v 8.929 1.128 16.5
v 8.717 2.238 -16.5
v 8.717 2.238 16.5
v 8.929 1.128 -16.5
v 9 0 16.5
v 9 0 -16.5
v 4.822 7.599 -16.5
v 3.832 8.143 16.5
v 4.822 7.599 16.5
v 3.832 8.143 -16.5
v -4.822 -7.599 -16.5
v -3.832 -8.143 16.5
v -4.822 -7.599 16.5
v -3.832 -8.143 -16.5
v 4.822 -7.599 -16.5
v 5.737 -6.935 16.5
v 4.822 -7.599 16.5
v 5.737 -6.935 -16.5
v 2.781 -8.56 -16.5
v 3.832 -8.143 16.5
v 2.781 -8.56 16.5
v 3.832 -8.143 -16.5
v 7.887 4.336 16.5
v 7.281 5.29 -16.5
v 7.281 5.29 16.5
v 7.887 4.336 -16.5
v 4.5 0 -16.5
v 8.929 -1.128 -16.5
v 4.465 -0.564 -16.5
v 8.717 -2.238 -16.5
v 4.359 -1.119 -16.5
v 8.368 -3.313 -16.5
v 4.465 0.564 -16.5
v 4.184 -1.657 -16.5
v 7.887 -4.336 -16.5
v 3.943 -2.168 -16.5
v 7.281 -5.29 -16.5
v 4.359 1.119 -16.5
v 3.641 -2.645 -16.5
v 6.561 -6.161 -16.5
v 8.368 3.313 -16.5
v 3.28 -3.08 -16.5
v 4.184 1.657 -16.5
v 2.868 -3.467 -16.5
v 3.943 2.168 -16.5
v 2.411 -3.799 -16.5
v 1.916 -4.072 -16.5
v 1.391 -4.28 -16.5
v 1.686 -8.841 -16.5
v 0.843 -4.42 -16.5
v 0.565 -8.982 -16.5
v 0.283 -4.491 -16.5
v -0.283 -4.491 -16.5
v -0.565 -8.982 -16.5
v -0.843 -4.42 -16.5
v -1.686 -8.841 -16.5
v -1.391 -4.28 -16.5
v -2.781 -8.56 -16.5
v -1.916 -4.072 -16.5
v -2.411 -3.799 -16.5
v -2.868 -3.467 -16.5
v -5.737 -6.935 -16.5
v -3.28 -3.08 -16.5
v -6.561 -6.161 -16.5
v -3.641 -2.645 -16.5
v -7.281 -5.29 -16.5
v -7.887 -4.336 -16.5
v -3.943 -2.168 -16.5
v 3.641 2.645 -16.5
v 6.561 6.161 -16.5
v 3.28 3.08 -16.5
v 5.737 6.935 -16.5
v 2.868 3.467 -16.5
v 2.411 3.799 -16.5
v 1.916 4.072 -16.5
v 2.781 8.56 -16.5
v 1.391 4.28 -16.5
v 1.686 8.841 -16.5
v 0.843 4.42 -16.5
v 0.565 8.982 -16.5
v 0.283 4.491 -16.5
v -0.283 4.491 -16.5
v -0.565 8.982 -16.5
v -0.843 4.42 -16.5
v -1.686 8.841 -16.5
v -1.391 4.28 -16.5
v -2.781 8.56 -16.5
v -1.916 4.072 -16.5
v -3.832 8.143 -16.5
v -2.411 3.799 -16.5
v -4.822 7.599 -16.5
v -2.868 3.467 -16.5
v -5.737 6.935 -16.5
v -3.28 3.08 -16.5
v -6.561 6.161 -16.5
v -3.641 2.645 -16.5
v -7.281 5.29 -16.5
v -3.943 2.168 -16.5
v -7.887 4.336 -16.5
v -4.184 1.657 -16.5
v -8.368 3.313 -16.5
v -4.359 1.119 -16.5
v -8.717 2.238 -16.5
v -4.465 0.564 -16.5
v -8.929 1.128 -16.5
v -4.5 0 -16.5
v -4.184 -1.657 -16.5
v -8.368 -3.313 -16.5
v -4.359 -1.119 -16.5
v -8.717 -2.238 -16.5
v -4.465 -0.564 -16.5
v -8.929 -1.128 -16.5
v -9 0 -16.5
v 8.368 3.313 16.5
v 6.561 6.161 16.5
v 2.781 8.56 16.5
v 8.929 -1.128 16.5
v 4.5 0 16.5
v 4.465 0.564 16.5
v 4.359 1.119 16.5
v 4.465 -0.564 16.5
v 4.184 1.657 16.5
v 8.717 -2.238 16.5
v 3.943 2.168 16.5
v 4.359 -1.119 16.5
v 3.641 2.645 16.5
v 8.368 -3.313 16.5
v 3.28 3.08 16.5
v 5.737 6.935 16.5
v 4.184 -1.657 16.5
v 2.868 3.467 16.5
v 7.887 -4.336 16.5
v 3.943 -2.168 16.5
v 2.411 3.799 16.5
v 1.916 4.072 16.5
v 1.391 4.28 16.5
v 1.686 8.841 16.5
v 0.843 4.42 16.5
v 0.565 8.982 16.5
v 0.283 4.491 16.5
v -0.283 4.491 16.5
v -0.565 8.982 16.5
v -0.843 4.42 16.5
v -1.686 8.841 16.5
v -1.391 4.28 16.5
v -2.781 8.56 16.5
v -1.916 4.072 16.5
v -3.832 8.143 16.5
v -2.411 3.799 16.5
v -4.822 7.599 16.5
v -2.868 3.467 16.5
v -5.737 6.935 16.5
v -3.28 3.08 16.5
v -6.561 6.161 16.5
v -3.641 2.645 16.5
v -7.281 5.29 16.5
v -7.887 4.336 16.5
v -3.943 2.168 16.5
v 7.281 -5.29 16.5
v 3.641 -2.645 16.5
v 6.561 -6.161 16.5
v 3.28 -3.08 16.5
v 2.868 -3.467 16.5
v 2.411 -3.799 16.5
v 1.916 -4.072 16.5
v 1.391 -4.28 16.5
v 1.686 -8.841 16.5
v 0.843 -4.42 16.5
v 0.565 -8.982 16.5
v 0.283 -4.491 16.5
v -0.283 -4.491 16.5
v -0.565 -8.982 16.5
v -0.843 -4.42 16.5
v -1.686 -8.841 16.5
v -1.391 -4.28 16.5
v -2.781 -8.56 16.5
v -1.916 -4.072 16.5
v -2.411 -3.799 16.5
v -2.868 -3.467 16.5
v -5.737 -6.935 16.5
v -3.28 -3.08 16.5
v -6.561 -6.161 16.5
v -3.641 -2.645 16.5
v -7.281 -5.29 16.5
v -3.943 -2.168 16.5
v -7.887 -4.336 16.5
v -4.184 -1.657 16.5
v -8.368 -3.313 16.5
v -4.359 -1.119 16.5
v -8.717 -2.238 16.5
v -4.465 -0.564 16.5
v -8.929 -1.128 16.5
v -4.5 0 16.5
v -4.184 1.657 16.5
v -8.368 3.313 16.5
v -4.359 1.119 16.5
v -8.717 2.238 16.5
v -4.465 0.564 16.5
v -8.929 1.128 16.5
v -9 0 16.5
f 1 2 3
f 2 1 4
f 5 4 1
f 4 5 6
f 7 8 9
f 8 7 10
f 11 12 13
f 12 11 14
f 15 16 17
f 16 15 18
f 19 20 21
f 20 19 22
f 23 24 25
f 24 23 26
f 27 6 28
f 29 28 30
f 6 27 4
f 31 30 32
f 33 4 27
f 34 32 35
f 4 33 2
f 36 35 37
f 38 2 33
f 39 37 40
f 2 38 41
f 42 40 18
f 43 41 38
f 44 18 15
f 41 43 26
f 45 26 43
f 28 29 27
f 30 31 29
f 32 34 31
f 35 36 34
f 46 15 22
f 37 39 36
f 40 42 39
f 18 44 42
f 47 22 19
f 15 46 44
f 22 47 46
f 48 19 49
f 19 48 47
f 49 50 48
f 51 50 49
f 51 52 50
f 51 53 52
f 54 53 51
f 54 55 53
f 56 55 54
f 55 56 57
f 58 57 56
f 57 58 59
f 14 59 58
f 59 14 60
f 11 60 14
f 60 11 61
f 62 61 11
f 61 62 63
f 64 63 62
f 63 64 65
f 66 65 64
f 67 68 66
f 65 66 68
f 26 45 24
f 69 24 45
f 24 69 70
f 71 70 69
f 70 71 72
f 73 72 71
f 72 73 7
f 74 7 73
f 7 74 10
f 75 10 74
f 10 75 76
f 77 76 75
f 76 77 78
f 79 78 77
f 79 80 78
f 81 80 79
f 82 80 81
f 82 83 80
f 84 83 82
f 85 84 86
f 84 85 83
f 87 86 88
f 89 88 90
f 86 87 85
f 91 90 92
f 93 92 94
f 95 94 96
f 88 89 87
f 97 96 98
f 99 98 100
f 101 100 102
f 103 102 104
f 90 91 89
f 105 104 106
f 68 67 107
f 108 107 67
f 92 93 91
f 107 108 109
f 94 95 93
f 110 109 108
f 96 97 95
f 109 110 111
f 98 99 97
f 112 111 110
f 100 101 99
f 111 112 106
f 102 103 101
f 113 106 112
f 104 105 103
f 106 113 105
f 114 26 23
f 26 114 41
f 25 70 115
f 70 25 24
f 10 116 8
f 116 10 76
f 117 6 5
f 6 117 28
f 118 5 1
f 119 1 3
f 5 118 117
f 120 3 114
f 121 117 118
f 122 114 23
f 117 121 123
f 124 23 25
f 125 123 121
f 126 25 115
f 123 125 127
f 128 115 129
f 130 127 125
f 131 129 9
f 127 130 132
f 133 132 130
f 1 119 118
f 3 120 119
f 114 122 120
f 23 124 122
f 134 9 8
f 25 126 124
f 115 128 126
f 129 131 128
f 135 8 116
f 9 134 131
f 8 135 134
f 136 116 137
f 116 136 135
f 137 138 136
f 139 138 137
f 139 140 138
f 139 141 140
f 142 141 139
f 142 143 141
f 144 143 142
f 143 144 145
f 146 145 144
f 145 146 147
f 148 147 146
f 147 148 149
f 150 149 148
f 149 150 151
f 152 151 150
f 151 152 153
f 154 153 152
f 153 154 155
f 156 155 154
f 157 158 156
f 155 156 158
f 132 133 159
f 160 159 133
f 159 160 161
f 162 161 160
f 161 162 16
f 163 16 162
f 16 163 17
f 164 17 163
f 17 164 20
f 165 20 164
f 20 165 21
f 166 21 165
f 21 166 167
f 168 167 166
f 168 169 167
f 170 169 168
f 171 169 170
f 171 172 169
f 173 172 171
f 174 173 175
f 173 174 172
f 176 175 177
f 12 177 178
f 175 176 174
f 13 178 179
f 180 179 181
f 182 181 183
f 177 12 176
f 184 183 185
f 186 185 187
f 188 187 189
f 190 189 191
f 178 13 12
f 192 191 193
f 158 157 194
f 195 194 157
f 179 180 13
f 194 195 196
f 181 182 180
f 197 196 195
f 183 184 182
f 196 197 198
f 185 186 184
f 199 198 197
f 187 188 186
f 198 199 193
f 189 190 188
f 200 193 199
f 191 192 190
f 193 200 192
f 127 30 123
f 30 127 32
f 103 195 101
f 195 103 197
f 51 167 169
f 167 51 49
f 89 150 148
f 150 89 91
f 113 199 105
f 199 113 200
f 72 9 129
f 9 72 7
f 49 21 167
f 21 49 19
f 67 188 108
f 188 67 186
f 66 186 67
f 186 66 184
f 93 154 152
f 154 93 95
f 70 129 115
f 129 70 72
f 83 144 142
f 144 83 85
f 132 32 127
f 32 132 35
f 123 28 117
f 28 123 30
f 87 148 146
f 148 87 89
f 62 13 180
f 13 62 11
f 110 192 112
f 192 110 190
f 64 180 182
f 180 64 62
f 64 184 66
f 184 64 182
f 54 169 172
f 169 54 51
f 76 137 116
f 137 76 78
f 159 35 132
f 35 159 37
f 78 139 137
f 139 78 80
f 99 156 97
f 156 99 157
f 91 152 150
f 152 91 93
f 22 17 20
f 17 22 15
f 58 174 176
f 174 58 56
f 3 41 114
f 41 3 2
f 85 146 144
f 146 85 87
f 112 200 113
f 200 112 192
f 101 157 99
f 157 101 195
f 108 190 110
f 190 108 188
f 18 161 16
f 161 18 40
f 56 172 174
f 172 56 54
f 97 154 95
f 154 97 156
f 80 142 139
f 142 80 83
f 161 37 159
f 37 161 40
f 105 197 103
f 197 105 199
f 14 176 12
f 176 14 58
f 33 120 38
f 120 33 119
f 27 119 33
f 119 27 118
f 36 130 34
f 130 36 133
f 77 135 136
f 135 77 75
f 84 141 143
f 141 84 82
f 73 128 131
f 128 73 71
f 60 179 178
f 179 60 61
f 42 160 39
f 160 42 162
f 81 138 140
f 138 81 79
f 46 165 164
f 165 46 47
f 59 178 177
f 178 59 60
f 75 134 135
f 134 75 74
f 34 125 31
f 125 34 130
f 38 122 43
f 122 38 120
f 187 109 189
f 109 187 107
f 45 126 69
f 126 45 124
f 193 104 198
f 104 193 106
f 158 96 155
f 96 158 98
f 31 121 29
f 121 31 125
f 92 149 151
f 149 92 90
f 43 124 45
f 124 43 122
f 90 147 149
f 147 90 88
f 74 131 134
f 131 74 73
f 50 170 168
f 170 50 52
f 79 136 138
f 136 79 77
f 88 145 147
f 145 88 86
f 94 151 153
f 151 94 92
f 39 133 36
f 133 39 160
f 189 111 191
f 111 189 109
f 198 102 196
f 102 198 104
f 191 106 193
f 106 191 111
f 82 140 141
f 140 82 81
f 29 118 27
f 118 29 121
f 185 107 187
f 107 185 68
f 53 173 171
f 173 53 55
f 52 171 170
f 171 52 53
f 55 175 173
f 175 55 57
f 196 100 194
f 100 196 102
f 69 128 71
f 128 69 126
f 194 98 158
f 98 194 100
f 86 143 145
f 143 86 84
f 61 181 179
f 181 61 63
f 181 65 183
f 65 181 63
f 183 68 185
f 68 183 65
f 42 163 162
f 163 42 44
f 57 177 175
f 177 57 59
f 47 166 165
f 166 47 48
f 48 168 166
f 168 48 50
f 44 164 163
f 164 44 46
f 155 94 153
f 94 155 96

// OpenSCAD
$fn = 50;


difference() {
	union() {
		translate(v = [0, 0, -16.5000000000]) {
			cylinder(h = 33, r = 9.0000000000);
		}
	}
	union() {
		translate(v = [0, 0, -100.0000000000]) {
			cylinder(h = 200, r = 4.5000000000);
		}
	}
}
